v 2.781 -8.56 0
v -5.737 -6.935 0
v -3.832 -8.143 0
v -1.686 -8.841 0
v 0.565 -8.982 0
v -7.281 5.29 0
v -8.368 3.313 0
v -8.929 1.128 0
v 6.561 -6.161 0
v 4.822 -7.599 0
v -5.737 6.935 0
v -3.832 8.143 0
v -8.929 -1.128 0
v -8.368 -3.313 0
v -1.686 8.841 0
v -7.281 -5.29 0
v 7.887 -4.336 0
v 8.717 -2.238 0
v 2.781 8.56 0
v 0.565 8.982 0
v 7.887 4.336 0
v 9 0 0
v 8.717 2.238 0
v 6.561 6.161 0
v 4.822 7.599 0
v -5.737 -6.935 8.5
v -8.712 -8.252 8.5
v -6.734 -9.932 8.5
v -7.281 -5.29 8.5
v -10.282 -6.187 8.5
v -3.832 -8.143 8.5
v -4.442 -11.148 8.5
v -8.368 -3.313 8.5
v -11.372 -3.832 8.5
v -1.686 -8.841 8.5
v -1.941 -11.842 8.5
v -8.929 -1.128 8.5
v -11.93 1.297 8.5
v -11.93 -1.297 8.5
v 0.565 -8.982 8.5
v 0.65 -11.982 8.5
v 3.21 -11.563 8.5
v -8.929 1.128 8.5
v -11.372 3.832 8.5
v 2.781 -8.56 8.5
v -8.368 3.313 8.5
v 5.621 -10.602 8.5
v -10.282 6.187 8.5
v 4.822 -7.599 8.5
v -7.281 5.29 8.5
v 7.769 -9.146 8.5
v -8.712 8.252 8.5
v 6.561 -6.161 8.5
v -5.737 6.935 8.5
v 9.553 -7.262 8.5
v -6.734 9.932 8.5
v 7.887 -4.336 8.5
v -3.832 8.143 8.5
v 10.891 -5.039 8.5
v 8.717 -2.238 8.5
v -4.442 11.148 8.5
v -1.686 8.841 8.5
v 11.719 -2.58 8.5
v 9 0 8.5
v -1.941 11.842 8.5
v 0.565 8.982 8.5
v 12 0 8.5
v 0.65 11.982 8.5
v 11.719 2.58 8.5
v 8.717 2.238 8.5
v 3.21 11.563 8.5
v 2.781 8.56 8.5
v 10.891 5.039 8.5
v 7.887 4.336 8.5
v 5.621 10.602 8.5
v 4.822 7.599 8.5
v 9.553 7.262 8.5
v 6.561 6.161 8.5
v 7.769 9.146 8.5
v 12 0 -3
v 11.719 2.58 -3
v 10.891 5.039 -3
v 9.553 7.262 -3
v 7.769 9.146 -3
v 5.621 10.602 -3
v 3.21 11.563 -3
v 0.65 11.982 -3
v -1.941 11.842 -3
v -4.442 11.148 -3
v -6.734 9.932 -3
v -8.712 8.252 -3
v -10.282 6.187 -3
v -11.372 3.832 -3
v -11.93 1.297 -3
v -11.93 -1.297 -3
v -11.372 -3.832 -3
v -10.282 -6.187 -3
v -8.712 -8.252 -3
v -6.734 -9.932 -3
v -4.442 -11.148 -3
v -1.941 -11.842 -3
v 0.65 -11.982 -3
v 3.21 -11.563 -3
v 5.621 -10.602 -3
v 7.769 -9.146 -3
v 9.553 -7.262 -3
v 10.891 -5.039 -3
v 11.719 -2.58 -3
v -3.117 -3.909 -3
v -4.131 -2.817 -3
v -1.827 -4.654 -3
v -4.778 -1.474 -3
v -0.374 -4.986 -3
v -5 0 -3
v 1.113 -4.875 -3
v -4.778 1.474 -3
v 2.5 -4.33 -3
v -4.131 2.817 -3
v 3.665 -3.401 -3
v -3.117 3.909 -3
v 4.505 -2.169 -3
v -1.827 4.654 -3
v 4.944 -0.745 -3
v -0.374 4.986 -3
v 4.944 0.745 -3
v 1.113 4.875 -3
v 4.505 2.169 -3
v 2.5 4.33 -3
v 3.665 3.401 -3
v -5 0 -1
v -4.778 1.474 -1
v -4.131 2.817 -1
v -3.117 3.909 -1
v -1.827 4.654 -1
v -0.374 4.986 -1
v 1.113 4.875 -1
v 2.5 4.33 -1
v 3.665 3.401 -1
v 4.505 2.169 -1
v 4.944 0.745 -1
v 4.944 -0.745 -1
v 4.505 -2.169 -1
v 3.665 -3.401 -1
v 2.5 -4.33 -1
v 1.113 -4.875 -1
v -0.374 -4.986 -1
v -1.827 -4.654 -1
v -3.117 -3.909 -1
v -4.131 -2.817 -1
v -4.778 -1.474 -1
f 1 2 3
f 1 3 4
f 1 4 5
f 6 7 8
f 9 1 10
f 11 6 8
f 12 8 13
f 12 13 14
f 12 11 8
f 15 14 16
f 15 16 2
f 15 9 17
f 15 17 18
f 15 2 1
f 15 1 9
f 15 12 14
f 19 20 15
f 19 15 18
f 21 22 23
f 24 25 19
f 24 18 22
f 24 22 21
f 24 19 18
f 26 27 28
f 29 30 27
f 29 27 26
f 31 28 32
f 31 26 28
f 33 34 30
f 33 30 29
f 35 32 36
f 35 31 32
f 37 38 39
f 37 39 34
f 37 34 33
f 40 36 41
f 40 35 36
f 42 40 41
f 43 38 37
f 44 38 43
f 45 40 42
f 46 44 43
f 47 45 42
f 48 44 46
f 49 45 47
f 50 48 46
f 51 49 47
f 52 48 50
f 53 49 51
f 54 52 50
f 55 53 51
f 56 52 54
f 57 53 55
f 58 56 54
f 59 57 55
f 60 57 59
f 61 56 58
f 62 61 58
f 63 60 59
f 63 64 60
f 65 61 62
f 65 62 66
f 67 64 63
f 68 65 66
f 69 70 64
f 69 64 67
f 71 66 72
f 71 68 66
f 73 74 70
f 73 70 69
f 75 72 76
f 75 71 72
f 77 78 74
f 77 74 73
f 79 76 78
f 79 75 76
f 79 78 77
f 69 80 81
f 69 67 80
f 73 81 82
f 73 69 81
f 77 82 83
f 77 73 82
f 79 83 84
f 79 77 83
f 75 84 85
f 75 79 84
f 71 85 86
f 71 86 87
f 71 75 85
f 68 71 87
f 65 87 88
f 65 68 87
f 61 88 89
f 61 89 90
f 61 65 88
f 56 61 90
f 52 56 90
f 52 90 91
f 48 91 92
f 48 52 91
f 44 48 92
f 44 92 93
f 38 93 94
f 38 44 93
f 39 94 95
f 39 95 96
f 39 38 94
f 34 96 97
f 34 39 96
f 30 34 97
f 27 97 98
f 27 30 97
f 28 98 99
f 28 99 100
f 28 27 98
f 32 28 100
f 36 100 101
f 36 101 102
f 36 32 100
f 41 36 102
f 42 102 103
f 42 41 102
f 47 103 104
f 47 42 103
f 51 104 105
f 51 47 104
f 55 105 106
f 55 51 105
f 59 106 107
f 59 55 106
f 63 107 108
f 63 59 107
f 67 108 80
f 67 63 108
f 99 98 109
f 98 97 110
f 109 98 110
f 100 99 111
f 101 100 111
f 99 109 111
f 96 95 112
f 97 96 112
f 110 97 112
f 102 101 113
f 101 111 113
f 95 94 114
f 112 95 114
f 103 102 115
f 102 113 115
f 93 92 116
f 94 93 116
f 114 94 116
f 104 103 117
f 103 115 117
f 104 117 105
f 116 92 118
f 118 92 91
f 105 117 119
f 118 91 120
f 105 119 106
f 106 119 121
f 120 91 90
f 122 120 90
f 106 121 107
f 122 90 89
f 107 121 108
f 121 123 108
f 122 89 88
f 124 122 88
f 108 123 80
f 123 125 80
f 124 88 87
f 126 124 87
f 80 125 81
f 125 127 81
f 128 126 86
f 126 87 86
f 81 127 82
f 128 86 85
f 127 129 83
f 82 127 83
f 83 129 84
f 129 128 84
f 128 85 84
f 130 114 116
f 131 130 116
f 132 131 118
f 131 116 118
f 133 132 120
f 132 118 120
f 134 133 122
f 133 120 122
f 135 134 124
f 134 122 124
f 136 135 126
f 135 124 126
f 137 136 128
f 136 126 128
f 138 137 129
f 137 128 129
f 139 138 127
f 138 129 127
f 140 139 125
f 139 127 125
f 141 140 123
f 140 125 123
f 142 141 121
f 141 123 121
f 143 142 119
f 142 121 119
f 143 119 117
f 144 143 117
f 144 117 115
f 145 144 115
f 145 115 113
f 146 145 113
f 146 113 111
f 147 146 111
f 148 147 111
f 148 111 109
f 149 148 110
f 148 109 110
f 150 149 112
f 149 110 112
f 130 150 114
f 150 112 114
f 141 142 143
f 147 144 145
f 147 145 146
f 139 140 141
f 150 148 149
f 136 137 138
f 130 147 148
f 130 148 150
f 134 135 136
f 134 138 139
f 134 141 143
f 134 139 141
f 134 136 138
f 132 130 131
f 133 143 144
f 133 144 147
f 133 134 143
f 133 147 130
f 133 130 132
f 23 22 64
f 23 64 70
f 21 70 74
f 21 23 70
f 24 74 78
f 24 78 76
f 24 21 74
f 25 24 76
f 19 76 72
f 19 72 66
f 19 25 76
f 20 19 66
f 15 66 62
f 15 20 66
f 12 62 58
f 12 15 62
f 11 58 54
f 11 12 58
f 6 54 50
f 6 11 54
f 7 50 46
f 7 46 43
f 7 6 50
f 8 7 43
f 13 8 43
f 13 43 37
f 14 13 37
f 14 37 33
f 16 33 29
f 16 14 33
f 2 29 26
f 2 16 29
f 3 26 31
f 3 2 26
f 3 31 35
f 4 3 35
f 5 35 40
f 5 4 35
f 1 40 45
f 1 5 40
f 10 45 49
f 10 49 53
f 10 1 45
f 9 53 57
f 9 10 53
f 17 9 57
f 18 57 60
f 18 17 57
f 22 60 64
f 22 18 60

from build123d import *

# Parameters (mm, degrees)
SKETCH1_R           = 12
SKETCH1_R_2         = 9
BOSS_EXTRUDE1_DEPTH = 8.5
BOSS_EXTRUDE2_START = -3
SKETCH1_2_R         = 12
BOSS_EXTRUDE2_DEPTH = 3
SKETCH2_R           = 5
CUT_EXTRUDE1_DEPTH  = 2


with BuildPart() as part:
    # Sketch1 → Boss-Extrude1 (new body)
    with BuildSketch(Plane.XY):
        Circle(SKETCH1_R)
        Circle(SKETCH1_R_2, mode=Mode.SUBTRACT)
    extrude(amount=BOSS_EXTRUDE1_DEPTH)

    # Sketch1<2> → Boss-Extrude2 (add)
    with BuildSketch(Plane.XY.offset(BOSS_EXTRUDE2_START)):
        Circle(SKETCH1_2_R)
    extrude(amount=BOSS_EXTRUDE2_DEPTH)

    # Sketch2 → Cut-Extrude1 (cut)
    with BuildSketch(Plane(origin=(0, 0, -3), x_dir=(-1, 0, 0), z_dir=(0, 0, -1))):
        Circle(SKETCH2_R)
    extrude(amount=-CUT_EXTRUDE1_DEPTH, mode=Mode.SUBTRACT)


solid = part.part
